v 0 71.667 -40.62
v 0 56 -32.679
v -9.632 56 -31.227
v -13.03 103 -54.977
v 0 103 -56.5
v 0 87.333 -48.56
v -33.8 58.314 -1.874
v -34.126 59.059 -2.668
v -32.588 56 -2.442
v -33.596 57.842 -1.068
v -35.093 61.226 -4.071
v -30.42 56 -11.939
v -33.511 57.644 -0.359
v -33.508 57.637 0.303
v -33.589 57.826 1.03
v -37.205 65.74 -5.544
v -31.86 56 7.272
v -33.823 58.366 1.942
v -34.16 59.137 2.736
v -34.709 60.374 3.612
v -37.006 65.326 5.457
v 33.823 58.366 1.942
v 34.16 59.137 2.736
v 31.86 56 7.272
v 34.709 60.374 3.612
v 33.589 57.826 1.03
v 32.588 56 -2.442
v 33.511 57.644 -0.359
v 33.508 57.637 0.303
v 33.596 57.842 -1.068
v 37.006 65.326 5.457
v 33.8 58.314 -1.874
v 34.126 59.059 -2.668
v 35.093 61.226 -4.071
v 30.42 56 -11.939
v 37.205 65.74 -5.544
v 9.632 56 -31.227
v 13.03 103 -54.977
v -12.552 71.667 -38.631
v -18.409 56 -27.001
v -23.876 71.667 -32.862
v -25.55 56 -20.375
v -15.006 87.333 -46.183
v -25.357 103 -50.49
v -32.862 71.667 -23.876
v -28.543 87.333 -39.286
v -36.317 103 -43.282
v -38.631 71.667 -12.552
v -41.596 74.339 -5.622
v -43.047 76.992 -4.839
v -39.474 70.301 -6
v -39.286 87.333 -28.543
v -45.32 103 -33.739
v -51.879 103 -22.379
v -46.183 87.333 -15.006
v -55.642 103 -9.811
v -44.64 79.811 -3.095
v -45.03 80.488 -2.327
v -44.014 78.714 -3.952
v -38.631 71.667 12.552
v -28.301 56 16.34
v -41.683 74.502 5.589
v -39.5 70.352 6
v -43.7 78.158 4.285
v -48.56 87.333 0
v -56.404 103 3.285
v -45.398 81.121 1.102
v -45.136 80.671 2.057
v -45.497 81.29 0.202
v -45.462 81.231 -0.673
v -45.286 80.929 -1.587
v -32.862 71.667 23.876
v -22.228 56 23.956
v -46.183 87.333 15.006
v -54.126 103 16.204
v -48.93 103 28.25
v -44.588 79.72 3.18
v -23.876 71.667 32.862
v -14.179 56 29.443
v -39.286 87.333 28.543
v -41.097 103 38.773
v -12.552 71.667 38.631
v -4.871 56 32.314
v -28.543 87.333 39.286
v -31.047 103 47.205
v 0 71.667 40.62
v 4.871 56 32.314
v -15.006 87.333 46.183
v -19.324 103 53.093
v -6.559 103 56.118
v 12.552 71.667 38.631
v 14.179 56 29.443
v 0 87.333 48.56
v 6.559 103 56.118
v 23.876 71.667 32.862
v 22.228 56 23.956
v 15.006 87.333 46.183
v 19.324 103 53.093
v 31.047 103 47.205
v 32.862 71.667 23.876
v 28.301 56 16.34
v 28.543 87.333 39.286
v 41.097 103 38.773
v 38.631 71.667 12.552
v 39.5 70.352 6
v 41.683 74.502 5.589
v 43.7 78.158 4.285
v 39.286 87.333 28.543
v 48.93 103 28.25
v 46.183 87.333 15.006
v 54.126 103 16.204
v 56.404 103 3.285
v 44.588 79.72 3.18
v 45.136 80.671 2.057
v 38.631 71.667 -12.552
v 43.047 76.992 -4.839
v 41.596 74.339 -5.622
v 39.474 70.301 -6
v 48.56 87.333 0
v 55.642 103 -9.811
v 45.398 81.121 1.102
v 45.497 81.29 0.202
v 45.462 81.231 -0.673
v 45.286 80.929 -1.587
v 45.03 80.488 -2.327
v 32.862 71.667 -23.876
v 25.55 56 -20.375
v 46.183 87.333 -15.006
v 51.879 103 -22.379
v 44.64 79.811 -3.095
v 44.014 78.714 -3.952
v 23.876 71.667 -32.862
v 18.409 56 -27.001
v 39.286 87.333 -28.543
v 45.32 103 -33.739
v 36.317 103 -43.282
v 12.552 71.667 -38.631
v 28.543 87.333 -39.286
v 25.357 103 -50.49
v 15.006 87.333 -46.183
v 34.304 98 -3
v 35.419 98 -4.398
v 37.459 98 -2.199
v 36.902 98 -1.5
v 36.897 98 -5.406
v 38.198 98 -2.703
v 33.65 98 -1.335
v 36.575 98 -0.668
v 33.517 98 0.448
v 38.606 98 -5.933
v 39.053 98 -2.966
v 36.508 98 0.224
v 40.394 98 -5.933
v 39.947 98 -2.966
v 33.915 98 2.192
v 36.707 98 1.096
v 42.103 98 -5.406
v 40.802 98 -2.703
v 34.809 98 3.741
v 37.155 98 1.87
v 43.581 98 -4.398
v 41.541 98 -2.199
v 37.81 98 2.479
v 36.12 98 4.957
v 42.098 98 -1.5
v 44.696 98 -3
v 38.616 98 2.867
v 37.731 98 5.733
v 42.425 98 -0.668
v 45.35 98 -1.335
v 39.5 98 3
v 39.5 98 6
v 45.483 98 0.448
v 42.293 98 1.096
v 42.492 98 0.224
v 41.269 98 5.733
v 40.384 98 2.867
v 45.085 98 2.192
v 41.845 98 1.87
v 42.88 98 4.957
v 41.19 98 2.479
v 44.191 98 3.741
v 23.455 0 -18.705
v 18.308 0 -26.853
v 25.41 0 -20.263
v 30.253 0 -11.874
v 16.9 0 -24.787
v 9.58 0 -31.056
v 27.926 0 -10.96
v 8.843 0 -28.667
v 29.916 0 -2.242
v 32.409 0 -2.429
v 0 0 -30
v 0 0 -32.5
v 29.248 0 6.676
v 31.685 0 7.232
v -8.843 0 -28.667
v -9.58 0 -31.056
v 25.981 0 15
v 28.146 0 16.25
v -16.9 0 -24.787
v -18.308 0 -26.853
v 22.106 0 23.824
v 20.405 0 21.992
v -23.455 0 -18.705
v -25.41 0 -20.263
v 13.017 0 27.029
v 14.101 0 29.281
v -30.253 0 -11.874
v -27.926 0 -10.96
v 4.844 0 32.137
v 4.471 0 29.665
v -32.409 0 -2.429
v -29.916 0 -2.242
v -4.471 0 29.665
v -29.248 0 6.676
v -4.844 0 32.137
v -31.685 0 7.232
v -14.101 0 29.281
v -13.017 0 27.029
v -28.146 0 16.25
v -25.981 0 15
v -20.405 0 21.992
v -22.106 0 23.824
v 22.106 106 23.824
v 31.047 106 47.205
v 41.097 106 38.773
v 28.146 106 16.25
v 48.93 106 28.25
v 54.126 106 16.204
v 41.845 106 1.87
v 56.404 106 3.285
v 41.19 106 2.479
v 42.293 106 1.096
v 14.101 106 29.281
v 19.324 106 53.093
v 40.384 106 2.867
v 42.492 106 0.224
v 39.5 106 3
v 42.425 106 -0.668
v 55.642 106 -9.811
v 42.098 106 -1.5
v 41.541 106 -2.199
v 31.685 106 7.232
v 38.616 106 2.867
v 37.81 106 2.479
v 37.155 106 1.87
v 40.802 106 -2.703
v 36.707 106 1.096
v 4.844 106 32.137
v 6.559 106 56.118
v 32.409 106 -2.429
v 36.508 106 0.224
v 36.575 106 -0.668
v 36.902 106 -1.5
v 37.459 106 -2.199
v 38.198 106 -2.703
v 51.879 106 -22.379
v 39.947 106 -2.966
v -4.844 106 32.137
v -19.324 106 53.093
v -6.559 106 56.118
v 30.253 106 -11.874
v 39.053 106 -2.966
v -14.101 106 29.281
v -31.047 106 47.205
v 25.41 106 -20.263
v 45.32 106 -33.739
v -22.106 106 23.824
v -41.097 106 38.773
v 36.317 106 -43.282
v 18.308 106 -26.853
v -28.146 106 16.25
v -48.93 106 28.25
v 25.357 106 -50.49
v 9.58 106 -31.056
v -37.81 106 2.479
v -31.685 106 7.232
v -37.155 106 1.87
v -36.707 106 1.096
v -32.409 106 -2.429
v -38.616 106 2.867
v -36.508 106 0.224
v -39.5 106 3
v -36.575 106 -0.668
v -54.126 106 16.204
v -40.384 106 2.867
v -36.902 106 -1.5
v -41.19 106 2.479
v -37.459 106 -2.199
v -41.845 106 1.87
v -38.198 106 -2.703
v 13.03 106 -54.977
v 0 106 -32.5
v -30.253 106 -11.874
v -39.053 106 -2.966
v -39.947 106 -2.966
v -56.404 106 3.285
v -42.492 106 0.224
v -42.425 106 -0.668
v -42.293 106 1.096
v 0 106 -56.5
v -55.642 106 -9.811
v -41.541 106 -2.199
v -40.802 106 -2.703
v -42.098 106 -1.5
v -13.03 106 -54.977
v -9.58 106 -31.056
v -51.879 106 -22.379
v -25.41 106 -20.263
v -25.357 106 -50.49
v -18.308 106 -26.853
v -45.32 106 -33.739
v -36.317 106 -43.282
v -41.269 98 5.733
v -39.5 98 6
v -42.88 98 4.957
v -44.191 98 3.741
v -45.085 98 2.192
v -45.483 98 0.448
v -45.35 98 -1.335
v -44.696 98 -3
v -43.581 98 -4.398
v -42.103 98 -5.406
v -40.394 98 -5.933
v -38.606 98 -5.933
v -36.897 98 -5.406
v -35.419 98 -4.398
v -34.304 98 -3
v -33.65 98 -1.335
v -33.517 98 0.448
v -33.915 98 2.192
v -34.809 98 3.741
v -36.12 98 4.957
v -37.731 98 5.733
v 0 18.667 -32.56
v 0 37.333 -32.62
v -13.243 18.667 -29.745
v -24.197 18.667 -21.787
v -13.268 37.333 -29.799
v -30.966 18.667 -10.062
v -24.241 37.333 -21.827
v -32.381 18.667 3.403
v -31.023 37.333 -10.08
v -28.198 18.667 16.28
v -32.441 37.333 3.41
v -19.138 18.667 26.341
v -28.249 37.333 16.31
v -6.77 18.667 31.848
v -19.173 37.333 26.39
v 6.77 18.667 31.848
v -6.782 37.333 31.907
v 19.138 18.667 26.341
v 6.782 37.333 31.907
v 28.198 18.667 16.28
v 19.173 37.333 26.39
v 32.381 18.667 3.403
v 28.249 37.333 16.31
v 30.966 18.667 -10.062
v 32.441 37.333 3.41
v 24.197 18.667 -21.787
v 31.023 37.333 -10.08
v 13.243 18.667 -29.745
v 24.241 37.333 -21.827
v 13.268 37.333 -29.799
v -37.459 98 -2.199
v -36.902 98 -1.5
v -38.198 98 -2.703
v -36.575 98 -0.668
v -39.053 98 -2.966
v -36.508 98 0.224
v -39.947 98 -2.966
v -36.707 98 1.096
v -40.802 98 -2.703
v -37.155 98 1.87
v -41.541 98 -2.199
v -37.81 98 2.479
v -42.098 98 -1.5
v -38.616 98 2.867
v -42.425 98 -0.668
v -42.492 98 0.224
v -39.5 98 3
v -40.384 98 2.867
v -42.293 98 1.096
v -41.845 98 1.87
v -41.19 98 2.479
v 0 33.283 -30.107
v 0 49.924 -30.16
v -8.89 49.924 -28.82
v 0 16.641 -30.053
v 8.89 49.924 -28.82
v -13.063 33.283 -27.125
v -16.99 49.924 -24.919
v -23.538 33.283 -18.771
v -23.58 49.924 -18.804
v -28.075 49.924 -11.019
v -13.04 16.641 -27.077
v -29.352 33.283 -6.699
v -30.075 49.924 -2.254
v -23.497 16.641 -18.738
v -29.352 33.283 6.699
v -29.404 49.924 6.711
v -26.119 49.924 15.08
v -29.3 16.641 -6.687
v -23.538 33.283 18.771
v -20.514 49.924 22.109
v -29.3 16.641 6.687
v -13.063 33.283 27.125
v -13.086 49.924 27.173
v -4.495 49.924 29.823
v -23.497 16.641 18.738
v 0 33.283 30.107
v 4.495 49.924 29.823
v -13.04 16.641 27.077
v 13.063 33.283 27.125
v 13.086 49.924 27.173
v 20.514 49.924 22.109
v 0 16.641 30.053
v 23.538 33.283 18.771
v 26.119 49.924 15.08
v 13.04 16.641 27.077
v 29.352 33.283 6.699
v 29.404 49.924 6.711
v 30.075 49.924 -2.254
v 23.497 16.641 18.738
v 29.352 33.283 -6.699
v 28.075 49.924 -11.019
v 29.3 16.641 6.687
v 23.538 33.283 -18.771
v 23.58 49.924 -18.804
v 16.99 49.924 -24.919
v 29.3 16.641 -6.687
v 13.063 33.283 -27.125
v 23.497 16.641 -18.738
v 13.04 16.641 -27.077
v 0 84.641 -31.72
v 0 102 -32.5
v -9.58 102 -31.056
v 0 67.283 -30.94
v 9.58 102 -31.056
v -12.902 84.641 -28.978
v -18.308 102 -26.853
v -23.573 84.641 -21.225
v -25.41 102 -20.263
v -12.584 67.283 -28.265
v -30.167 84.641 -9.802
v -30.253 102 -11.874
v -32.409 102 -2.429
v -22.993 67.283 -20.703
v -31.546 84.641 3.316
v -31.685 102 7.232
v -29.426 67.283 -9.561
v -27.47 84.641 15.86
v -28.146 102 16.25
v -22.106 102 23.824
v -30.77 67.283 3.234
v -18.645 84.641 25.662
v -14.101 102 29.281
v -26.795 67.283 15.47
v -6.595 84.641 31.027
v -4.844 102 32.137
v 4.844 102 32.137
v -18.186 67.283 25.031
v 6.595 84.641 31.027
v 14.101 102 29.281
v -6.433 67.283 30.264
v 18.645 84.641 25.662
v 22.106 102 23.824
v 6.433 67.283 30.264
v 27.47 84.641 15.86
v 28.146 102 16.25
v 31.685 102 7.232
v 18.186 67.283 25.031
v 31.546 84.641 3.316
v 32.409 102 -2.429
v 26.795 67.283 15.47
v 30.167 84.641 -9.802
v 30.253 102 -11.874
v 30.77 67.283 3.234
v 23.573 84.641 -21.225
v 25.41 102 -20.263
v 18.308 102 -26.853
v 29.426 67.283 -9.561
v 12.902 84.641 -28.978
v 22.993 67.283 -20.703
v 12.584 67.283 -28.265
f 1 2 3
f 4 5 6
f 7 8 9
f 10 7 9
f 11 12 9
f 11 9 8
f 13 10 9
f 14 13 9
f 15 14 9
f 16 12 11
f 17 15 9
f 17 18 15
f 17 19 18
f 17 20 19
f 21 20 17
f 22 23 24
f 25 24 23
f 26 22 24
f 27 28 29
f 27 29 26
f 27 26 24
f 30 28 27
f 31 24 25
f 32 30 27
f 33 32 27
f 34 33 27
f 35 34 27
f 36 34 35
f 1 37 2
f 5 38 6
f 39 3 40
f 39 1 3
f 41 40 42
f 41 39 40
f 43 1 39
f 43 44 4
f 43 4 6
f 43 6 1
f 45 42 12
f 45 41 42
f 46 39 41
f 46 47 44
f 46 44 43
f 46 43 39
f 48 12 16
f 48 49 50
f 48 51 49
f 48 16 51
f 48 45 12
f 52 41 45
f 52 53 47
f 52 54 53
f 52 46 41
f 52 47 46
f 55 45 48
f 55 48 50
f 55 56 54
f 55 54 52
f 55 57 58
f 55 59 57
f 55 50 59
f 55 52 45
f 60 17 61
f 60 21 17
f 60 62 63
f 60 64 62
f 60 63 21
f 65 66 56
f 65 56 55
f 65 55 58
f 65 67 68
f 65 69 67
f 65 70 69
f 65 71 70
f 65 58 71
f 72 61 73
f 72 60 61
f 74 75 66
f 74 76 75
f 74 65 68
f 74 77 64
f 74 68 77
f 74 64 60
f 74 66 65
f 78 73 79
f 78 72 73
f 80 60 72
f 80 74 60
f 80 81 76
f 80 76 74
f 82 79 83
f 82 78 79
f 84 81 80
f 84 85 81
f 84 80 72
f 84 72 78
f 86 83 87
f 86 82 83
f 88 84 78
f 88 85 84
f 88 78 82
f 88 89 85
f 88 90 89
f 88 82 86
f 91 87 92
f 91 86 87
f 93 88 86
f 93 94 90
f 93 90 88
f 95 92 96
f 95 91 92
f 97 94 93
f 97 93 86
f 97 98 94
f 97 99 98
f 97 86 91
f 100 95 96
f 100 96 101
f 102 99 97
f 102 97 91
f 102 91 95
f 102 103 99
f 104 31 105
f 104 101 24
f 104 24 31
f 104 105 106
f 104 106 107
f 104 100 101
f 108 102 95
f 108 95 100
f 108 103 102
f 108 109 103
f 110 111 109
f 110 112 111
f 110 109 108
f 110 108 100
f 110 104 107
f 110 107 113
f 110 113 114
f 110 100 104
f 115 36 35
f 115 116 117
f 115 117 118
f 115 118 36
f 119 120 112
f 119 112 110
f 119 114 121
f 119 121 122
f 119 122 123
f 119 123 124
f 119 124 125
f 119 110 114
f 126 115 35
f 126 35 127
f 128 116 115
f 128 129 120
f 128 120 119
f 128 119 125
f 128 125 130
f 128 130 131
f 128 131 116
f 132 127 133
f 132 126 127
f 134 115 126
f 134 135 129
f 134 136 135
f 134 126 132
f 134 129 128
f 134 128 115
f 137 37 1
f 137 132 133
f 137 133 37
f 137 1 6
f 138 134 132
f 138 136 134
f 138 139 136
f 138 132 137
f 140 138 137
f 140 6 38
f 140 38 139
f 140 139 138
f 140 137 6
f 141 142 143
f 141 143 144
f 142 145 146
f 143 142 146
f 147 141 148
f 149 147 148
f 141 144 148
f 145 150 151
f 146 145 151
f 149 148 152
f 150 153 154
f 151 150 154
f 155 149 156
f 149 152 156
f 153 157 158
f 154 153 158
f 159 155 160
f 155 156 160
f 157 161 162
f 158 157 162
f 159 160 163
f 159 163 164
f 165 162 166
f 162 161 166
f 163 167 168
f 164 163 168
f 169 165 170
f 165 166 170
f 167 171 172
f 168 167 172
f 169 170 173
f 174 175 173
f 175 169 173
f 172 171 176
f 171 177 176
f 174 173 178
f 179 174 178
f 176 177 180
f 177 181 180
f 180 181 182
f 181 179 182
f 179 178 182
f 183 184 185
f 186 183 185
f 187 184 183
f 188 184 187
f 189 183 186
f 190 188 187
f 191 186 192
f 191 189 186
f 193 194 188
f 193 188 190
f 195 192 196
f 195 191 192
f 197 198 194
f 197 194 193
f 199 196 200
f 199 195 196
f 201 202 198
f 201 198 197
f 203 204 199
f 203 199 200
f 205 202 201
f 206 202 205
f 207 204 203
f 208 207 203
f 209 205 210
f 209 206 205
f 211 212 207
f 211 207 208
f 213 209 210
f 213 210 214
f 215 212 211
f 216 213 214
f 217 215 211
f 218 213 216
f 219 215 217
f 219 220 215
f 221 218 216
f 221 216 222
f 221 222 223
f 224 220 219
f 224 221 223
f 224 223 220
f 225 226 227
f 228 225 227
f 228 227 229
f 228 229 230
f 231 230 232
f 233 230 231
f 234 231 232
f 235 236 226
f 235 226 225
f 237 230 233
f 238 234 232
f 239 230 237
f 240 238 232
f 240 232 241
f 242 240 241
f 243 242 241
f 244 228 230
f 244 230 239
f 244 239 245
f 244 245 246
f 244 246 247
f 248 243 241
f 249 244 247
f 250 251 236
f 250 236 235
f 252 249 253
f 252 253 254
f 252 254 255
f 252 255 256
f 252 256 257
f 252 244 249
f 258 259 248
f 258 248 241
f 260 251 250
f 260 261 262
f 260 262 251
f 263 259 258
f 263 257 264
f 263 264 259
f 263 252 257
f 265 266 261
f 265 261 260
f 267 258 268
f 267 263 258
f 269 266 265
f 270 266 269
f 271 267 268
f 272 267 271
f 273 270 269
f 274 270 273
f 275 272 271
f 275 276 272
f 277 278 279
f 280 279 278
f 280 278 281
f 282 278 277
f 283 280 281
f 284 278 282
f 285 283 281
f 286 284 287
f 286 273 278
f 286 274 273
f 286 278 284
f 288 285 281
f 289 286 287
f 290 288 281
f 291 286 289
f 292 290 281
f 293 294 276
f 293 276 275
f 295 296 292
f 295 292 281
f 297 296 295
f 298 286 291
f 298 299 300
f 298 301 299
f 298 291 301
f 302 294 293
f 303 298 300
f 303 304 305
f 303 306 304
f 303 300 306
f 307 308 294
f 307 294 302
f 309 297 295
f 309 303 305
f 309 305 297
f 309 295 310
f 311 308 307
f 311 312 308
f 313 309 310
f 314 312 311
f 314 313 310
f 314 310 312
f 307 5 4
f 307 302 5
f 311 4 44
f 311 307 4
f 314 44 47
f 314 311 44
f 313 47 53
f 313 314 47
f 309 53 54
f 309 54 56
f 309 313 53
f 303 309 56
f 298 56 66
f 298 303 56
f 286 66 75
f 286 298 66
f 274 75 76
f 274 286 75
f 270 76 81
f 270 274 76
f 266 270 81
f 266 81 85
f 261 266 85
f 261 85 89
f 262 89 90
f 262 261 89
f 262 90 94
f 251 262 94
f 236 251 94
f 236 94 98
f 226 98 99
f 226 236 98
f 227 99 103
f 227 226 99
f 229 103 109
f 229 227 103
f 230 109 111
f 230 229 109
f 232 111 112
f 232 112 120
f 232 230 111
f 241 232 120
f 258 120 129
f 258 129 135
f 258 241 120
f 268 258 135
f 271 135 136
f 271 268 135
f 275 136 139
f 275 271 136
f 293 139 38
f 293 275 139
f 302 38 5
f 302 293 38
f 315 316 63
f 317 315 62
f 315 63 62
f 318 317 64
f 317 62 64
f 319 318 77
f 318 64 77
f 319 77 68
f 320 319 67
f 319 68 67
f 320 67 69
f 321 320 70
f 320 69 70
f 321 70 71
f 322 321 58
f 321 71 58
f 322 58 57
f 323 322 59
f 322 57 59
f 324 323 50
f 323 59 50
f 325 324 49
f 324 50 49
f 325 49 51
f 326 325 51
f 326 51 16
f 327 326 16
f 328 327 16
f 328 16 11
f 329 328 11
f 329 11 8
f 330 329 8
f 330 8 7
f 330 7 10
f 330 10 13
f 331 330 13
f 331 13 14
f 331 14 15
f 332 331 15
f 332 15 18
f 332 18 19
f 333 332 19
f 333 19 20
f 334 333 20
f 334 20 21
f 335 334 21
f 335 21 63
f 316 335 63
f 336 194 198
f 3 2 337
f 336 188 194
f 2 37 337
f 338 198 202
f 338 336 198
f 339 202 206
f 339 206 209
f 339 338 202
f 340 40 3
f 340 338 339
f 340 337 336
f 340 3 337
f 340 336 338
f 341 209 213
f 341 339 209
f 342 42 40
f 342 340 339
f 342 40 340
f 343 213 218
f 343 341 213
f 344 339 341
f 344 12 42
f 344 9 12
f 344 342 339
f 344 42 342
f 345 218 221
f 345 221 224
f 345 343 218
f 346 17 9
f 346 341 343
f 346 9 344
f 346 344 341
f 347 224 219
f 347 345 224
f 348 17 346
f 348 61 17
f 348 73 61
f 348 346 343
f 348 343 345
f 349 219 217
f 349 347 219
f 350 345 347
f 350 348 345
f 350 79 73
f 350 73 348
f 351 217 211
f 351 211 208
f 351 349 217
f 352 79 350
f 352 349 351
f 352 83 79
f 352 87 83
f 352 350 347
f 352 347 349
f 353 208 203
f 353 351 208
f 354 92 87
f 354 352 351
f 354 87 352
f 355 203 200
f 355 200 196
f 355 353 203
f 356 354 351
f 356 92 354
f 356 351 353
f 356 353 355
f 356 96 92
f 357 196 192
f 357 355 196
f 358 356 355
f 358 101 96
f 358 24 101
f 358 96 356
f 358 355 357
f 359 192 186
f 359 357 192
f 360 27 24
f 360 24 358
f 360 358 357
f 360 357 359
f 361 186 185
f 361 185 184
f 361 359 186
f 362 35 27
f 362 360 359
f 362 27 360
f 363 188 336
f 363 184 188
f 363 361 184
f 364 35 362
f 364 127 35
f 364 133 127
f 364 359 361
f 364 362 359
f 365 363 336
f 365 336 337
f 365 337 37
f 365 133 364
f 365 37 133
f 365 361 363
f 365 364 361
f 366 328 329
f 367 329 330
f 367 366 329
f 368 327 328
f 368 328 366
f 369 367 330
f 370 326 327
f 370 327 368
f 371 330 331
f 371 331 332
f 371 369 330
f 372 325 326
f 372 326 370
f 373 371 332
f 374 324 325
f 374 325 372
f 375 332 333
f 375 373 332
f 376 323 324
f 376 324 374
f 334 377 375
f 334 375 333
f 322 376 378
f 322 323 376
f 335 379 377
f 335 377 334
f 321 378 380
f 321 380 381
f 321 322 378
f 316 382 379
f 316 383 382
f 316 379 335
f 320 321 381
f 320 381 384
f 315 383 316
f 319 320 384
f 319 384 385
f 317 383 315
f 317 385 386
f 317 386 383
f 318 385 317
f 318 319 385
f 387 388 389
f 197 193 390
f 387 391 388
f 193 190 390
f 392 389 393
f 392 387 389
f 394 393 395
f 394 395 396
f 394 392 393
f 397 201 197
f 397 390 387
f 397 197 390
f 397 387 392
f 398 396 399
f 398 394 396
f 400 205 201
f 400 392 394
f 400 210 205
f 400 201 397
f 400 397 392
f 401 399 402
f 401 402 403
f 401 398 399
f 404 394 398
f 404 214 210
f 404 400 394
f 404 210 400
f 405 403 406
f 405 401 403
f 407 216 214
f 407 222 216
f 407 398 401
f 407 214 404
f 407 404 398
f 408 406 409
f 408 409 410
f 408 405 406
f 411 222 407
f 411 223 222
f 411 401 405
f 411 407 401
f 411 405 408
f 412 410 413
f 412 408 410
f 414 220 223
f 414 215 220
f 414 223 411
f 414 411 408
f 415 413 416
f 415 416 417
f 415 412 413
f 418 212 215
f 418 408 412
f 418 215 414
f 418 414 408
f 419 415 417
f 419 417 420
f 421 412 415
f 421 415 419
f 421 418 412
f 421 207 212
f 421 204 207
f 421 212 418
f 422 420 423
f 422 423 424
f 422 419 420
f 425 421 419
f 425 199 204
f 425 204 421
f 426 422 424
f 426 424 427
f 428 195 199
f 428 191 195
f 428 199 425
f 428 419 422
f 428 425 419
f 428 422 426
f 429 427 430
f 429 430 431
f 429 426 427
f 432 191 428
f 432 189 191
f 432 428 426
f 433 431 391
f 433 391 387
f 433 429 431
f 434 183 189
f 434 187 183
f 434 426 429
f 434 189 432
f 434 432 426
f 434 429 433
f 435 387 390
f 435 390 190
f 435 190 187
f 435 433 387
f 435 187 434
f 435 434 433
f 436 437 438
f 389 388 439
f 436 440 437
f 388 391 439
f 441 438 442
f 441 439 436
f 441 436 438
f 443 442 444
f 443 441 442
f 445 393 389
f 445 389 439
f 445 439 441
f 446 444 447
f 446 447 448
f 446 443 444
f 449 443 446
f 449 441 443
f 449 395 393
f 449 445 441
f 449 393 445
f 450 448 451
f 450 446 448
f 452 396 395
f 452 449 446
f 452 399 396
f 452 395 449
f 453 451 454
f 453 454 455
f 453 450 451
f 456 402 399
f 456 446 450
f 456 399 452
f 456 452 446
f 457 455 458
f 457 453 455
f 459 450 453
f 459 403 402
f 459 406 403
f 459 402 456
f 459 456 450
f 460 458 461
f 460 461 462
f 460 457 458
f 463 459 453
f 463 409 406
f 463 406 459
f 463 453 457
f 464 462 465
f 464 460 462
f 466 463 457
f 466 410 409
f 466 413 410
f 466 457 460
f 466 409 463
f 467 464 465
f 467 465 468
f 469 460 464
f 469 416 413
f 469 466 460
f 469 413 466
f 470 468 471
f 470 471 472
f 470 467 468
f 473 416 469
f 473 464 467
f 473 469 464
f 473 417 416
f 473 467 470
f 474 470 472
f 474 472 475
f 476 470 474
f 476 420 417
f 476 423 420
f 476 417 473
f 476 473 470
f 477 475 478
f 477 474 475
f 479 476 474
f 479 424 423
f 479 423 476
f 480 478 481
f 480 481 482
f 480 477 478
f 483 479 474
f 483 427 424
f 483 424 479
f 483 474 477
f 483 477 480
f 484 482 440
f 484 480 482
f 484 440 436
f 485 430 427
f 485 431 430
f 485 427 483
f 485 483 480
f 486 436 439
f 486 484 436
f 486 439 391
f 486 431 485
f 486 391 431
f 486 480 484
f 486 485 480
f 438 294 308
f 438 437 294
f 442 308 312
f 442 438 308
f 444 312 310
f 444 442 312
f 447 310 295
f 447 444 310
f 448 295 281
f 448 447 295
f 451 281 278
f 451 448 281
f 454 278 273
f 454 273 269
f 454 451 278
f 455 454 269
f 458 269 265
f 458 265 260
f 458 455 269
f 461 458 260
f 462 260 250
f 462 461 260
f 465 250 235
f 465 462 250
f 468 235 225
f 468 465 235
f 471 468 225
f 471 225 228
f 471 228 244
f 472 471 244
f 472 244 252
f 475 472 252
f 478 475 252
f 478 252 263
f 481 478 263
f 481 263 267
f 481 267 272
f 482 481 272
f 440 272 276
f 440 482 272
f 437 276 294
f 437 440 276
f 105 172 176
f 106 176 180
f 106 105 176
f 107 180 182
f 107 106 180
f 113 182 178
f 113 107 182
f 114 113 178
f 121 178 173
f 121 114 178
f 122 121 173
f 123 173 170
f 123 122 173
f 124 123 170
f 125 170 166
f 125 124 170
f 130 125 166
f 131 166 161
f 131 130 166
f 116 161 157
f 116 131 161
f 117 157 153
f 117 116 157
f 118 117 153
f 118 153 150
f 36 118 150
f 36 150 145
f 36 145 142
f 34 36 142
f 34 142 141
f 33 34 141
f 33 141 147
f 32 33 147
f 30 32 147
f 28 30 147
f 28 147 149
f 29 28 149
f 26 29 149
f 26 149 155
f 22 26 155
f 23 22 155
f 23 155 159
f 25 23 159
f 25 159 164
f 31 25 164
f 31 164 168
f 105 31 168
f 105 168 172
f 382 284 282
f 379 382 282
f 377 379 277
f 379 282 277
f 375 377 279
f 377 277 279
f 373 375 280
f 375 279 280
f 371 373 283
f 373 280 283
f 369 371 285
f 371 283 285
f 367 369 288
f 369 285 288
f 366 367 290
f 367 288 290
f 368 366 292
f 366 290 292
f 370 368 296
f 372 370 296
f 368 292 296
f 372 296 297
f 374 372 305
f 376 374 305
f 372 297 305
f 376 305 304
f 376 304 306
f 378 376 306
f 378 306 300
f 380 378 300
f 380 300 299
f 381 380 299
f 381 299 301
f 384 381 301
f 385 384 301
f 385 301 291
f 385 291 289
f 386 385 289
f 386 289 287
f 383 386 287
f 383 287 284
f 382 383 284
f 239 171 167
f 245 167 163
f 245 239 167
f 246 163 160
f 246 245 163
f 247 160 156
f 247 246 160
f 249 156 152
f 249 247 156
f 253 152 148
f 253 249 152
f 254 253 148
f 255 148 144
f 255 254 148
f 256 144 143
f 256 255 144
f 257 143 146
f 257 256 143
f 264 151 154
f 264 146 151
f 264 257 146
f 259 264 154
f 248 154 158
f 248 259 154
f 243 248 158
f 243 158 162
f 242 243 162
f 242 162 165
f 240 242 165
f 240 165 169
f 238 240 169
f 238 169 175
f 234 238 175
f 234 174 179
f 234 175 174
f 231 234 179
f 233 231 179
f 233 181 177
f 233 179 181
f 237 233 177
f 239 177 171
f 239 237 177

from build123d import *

# Parameters (mm, degrees)
SKETCH_2_R          = 3
CUT_EXTRUDE_3_DEPTH = 35
CUT_EXTRUDE_START   = -10
SKETCH_4_R          = 6
CUT_EXTRUDE_4_DEPTH = 52


with BuildPart() as part:
    # Эскиз1 → Повернуть2 (revolve)
    with BuildSketch(Plane.XY, mode=Mode.PRIVATE) as revolve_2_sk:
        Polygon((30, 0), (32.500012812, 0), (32.679297783, 56), (56.5, 103), (56.5, 106), (32.5, 106), (32.5, 102), (30.159832694, 49.92404441), align=None)
    revolve(revolve_2_sk.sketch.rotate(Axis((0, 0, 0), (0, 1, 0)), 90), axis=Axis((0, 0, 0), (0, 1, 0)))

    # Эскиз2 → Вырез-Вытянуть3 (cut)
    with BuildSketch(Plane(origin=(0, 106, 0), x_dir=(1, 0, 0), z_dir=(0, 1, 0))):
        with Locations(Location((-39.5, 0, 0), (0, 0, 270))):
            Circle(SKETCH_2_R)
    cut_extrude_3 = extrude(amount=-CUT_EXTRUDE_3_DEPTH, mode=Mode.SUBTRACT)

    # Зеркальное отражение1: Вырез-Вытянуть3 across plane
    add(cut_extrude_3.mirror(Plane(origin=(0, 0, 0), x_dir=(0, 0, 1), z_dir=(1, 0, 0))), mode=Mode.SUBTRACT)

    # Эскиз4 → Вырез-Вытянуть4 (cut)
    with BuildSketch(Plane(origin=(0, 56, 0), x_dir=(1, 0, 0), z_dir=(0, 1, 0)).offset(CUT_EXTRUDE_START)):
        with Locations(Location((39.5, 0, 0), (0, 0, 270))):
            Circle(SKETCH_4_R)
    cut_extrude_4 = extrude(amount=CUT_EXTRUDE_4_DEPTH, mode=Mode.SUBTRACT)

    # Зеркальное отражение2: Вырез-Вытянуть4 across plane
    add(cut_extrude_4.mirror(Plane(origin=(0, 0, 0), x_dir=(0, 0, 1), z_dir=(1, 0, 0))), mode=Mode.SUBTRACT)


solid = part.part
